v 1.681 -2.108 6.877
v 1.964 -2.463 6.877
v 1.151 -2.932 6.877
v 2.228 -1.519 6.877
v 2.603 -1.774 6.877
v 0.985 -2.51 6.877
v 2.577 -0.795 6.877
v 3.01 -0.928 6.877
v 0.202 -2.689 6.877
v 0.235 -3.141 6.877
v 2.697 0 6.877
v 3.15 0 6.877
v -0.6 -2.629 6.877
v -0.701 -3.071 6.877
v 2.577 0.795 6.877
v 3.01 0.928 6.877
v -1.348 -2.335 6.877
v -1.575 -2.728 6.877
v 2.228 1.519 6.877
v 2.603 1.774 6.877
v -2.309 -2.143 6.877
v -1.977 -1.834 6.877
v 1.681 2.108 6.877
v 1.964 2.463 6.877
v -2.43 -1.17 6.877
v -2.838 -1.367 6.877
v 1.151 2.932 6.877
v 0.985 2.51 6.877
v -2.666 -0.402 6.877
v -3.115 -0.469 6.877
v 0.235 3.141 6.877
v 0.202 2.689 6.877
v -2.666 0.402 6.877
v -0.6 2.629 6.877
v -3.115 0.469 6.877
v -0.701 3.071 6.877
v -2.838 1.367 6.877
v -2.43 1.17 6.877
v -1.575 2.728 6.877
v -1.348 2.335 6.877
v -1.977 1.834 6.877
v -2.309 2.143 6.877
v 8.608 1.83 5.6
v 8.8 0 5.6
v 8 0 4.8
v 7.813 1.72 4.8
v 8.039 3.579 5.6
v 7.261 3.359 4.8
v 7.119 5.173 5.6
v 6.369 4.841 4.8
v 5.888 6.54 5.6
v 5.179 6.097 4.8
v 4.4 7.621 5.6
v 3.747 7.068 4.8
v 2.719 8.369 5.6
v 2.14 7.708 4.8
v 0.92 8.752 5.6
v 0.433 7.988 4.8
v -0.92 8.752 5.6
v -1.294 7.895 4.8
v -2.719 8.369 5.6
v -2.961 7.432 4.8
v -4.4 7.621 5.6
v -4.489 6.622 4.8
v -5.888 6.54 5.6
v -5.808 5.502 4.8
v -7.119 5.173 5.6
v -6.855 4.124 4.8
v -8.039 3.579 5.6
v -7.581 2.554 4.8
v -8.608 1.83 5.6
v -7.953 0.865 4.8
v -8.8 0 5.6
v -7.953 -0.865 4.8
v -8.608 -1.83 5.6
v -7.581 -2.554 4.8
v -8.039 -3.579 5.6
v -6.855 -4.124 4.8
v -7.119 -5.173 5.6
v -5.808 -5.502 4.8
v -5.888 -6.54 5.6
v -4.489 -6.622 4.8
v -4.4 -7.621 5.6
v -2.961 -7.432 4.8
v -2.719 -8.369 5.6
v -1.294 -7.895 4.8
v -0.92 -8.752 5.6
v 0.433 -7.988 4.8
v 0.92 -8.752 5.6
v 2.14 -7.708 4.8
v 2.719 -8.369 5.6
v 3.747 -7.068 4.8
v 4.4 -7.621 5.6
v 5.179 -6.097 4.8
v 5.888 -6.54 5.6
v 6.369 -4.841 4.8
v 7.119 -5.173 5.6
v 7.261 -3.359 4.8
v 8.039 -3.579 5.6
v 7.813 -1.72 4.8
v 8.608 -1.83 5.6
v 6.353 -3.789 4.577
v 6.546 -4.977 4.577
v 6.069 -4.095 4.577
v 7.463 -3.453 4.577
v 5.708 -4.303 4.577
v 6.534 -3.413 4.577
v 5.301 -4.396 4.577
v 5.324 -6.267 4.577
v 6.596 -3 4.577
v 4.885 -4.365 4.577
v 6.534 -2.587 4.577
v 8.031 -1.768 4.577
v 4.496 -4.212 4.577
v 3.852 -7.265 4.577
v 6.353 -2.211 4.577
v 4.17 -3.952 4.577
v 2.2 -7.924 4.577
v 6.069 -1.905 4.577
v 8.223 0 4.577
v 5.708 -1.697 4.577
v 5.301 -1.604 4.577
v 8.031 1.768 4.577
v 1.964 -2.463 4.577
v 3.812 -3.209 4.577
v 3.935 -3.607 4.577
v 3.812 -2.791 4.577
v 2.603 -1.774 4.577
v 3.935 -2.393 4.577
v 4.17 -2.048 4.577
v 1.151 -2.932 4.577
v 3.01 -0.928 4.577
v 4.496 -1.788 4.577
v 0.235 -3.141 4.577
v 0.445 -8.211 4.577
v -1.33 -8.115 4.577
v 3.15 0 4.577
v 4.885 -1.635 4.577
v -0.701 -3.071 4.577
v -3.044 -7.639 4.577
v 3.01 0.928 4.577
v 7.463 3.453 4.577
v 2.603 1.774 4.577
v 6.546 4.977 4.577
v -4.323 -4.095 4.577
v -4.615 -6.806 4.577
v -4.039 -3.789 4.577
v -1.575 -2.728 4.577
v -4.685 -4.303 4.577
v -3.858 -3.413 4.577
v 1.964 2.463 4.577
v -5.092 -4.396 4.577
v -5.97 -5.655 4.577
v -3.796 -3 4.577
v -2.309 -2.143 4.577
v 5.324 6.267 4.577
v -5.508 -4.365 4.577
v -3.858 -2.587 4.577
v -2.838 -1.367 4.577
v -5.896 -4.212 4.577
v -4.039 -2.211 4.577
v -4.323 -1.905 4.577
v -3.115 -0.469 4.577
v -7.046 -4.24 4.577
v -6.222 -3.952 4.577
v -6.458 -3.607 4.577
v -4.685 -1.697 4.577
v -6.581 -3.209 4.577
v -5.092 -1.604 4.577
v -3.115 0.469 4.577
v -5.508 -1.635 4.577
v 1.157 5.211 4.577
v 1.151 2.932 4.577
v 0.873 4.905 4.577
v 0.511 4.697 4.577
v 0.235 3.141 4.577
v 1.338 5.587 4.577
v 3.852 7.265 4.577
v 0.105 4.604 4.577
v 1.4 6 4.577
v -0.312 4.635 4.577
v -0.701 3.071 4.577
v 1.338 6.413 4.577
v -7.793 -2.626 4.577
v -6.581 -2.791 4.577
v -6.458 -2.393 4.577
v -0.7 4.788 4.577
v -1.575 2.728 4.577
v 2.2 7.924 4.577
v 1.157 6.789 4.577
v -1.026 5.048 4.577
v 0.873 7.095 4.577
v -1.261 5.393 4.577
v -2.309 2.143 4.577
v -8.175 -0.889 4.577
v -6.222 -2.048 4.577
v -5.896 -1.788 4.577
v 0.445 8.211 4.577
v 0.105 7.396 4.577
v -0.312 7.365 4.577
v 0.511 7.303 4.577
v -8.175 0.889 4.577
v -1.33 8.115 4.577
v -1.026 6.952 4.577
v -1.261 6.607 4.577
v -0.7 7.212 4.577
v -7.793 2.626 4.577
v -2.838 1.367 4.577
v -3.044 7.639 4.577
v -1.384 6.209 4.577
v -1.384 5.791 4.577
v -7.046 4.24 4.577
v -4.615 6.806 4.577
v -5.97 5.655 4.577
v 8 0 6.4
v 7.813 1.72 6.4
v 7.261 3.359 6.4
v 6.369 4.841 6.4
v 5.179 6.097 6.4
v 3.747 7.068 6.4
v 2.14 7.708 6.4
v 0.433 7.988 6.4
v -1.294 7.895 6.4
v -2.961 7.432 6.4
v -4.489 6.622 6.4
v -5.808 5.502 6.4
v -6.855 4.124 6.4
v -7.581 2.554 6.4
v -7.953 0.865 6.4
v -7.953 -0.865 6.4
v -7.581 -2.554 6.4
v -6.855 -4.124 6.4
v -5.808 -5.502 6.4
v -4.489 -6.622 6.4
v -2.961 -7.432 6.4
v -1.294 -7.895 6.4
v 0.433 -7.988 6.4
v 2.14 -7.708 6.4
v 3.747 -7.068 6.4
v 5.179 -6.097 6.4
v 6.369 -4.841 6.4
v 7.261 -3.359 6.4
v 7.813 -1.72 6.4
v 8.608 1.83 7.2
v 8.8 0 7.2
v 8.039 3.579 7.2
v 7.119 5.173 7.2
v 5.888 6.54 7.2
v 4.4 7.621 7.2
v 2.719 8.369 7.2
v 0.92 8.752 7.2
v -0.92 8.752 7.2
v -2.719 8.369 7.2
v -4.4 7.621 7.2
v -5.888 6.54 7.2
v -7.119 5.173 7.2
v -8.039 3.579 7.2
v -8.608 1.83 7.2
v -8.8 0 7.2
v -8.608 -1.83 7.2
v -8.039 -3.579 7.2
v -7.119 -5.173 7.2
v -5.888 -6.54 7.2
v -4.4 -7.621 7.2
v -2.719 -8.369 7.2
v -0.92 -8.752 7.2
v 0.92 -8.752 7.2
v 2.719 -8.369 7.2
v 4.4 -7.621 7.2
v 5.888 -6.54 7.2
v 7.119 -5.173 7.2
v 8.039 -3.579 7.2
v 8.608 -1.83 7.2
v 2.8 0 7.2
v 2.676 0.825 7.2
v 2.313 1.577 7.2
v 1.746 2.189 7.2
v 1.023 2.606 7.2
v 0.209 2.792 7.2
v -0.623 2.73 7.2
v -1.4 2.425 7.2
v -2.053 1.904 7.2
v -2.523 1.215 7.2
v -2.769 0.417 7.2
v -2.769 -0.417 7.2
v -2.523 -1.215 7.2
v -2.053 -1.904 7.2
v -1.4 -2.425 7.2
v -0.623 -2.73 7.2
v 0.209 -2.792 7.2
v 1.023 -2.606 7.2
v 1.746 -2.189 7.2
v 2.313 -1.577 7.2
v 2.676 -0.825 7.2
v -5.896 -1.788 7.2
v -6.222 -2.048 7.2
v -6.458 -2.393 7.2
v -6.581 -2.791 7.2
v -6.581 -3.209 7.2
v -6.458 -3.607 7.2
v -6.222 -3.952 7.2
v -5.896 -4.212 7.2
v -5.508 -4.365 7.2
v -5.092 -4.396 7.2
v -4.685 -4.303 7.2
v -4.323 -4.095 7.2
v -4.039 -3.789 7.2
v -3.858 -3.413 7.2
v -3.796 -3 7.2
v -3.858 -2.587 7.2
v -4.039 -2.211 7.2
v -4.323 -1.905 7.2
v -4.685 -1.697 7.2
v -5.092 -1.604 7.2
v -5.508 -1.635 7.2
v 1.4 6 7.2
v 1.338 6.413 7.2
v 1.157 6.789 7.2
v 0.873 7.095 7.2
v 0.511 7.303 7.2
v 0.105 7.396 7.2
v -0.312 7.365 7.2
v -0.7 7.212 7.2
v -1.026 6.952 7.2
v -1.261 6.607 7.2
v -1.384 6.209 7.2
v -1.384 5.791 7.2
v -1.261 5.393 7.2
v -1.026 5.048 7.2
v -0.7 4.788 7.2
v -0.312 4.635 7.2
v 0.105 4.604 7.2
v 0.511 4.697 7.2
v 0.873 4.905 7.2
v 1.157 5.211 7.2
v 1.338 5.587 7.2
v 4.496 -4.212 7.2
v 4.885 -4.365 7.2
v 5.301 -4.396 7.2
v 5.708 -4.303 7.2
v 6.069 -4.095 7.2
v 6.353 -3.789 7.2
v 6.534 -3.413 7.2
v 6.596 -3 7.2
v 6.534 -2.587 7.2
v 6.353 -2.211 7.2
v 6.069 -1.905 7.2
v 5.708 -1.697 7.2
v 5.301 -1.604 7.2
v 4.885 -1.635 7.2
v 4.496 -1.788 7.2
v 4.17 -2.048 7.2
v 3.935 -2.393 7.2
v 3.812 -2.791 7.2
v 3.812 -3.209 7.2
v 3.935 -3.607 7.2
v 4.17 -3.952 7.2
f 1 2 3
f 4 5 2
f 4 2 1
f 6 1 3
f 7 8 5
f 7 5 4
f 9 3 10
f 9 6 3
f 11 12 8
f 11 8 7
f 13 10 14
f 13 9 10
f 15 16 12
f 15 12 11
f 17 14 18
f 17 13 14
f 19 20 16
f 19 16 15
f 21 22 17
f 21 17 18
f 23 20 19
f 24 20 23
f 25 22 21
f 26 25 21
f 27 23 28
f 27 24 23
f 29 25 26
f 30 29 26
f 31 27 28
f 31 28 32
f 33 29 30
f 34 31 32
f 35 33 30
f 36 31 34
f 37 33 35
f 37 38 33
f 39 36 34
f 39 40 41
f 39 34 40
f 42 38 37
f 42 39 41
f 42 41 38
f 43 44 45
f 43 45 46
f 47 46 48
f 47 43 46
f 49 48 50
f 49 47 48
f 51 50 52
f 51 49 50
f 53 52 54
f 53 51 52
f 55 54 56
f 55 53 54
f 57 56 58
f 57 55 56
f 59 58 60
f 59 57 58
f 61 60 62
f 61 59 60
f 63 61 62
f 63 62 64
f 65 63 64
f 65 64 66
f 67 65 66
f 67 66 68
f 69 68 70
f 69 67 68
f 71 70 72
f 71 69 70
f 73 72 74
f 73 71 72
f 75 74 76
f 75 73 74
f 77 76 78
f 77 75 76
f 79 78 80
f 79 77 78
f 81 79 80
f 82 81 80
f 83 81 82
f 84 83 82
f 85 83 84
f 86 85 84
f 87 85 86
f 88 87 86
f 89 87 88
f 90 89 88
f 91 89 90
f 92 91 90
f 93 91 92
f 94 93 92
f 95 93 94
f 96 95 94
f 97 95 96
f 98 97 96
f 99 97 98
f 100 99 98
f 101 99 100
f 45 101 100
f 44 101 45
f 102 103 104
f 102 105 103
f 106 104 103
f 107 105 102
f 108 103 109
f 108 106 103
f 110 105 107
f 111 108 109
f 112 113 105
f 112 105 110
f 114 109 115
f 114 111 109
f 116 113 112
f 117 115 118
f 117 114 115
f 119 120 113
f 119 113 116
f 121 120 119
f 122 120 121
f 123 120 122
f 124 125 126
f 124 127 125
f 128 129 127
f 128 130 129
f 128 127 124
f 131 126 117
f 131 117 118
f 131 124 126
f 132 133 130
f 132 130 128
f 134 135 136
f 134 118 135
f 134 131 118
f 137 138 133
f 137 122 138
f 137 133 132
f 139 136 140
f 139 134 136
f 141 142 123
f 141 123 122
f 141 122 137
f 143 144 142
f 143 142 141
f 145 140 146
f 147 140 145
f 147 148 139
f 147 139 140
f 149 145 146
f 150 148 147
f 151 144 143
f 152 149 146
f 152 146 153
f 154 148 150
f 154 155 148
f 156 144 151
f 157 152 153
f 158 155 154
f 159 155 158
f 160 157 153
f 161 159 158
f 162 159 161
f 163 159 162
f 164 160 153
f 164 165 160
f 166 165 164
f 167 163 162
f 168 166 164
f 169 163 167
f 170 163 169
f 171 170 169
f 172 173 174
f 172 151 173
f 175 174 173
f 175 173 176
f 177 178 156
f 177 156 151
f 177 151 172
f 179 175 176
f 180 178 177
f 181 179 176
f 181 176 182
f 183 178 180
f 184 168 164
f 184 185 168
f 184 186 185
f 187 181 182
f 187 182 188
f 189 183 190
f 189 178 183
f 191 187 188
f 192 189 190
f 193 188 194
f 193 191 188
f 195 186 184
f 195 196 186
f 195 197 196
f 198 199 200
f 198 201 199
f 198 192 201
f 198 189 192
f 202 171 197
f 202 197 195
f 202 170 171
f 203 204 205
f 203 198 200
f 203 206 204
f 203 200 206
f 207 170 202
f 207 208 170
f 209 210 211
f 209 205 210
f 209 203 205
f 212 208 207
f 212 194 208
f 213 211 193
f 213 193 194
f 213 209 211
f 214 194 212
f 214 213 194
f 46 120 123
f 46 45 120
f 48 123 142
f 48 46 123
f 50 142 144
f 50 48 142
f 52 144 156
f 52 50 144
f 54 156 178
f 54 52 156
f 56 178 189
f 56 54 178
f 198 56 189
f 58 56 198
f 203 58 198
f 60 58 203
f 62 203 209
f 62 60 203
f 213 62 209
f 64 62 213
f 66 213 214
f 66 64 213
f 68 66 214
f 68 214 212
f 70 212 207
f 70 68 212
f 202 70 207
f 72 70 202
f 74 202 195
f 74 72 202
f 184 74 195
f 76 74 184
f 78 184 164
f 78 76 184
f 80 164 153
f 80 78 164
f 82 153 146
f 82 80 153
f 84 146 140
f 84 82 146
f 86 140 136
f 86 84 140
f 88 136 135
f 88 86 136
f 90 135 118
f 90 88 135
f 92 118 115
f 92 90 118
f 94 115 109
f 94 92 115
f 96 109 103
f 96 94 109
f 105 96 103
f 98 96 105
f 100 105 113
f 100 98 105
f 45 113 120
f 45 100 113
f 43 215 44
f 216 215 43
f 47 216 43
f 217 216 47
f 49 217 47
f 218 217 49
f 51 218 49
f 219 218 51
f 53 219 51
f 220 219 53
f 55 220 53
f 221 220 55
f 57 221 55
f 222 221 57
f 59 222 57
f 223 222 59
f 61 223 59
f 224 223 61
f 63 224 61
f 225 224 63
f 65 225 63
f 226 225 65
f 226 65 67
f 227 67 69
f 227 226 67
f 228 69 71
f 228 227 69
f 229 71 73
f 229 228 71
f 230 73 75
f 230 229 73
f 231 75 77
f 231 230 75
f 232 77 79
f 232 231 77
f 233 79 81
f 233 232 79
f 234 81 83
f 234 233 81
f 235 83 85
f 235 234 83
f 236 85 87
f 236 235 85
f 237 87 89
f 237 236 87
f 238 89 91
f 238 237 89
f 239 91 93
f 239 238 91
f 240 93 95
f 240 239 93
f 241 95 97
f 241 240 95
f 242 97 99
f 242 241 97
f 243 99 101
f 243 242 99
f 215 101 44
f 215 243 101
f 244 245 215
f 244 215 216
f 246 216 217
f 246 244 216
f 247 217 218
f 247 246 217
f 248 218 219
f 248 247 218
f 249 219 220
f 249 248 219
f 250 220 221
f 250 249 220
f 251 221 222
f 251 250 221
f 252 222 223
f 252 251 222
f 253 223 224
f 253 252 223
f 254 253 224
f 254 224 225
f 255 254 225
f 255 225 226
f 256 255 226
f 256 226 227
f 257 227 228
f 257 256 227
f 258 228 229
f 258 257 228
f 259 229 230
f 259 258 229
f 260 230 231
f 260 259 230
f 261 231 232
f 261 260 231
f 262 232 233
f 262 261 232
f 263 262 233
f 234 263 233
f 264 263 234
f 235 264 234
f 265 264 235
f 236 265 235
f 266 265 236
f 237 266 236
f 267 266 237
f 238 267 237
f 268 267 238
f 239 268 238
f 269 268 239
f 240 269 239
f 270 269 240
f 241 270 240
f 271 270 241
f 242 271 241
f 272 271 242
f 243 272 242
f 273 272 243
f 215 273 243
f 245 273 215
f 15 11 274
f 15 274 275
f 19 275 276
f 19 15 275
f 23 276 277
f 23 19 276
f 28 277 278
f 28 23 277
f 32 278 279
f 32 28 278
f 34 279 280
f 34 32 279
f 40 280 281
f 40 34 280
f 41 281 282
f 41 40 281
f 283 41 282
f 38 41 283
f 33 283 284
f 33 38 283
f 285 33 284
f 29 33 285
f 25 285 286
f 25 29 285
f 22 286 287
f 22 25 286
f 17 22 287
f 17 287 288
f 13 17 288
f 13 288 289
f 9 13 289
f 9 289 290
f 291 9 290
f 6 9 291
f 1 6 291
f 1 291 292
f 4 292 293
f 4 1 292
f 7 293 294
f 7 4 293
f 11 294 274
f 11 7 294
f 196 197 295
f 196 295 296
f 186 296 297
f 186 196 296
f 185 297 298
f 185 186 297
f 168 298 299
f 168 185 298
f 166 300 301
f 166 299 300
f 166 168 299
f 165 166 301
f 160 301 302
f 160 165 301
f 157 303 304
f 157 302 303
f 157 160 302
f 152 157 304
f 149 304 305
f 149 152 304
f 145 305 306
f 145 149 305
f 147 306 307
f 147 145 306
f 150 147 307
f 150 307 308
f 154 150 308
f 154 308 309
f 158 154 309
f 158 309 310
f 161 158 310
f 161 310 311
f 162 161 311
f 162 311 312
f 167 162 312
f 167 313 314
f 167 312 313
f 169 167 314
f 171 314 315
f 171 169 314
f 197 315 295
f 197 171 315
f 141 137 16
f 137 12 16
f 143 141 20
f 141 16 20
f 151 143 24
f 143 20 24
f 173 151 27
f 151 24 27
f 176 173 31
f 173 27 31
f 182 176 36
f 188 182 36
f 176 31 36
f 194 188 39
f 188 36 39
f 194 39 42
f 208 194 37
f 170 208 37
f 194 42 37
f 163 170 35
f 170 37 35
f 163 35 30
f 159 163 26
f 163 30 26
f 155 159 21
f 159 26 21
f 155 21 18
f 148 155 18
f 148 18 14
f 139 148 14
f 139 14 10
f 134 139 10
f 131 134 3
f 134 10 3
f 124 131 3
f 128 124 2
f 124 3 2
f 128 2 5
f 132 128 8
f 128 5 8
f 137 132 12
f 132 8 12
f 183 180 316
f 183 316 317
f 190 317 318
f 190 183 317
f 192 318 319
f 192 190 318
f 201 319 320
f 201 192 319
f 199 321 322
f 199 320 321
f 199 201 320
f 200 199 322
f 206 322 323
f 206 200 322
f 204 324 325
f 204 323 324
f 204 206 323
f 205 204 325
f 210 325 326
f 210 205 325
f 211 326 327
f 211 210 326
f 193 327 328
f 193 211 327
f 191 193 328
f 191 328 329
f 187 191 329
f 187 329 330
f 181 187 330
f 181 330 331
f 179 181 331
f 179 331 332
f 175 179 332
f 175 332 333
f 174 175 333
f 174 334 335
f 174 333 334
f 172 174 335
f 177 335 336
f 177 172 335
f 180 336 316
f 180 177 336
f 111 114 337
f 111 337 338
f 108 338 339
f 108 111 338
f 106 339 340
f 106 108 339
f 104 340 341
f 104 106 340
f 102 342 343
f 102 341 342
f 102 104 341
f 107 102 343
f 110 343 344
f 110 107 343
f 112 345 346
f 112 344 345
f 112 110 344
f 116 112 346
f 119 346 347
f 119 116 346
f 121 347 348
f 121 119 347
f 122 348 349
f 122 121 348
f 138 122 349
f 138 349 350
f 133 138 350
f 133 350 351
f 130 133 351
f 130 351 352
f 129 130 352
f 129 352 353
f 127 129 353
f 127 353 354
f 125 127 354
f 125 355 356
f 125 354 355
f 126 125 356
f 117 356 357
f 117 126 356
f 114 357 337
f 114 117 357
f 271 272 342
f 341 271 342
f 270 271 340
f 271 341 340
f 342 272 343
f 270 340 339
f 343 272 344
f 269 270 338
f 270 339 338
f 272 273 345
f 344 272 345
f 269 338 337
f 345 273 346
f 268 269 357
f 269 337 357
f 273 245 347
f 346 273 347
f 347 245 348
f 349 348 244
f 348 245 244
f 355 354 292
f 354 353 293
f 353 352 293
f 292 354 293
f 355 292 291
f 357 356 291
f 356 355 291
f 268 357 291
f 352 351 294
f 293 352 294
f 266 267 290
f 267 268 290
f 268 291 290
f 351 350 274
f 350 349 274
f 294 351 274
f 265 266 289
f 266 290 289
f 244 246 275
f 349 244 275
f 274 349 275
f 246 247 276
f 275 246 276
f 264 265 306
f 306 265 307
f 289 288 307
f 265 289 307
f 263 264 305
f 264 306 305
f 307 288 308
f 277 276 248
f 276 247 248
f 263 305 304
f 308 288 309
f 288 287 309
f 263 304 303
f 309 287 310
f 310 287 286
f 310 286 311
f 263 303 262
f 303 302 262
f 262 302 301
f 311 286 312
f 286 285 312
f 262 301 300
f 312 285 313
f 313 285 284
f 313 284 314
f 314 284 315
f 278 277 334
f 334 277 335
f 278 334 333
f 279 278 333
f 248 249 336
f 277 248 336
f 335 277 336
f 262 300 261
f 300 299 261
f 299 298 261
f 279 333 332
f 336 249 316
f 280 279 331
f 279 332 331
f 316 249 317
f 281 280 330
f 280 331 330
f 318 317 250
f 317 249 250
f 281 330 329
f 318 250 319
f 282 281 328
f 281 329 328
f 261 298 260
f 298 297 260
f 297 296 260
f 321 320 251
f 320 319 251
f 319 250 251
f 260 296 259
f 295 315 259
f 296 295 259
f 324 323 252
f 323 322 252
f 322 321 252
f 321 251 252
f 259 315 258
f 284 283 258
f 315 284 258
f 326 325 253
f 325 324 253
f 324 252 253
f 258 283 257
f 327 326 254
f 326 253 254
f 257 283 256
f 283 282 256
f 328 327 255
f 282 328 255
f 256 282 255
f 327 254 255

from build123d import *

# Parameters (mm, degrees)
SKETCH019_W    = 10
SKETCH019_H    = 2.7812096768
SKETCH005_W    = 10
SKETCH005_H    = 2.2955317108
CYLINDER_R     = 1.4
CYLINDER_DEPTH = 10
ARRAY001_COUNT = 3
SKETCH018_W    = 3.15
SKETCH018_H    = 2.3
SKETCH002_W    = 5
SKETCH002_H    = 6.8
ARRAY_Z_COUNT  = 6
ARRAY_Z_PITCH  = 1.6


with BuildPart() as clone_of_middledom001:
    # Sketch019 → Revolution008 (revolve)
    with BuildSketch(Plane.XZ):
        with Locations((5, 3.1861365492)):
            Rectangle(SKETCH019_W, SKETCH019_H)
    revolve(axis=Axis((0, 0, 0), (0, 0, 1)))


with BuildPart() as clone_of_lowerdomain001:
    # Sketch005 → Revolution004 (revolve)
    with BuildSketch(Plane.XZ):
        with Locations((5, 0.6477658554)):
            Rectangle(SKETCH005_W, SKETCH005_H)
    revolve(axis=Axis((0, 0, 0), (0, 0, 1)))


with BuildPart() as boltholes:
    # Cylinder → Cylinder (new body)
    with BuildSketch(Plane(origin=(0, 6, -1), x_dir=(1, 0, 0), z_dir=(0, 0, 1))):
        Circle(CYLINDER_R)
    extrude(amount=CYLINDER_DEPTH)

    # Array001: BoltHoles ×3 about axis
    array001_axis = Axis((0, 0, 0), (0, 0, 1))


with BuildPart() as boltholes_1:
    add(boltholes.part)
    for i in range(1, ARRAY001_COUNT):
        add(boltholes.part.rotate(array001_axis, i * 360 / ARRAY001_COUNT))


with BuildPart() as ps2long001:
    # Sketch018 → Revolution007 (revolve)
    with BuildSketch(Plane.XZ):
        with Locations((1.575, 5.7267413876)):
            Rectangle(SKETCH018_W, SKETCH018_H)
    revolve(axis=Axis((0, 0, 0), (0, 0, 1)))


with BuildPart() as clone_of_laq:
    # Sketch007 → Revolution006 (revolve)
    with BuildSketch(Plane.XZ):
        with BuildLine():
            ThreePointArc((1.5, 1.7955317108), (0.867020761, 2.4322916436), (0, 2.6655317108))
            Line((0, 2.6655317108), (0, 0.7955317108))
            Line((0, 0.7955317108), (1.5, 0.7955317108))
            Line((1.5, 1.7955317108), (1.5, 0.7955317108))
        make_face()
    revolve(axis=Axis((0, 0, 0), (0, 0, 1)))


with BuildPart() as innergroovedom001:
    # Sketch002 → Revolution002 (revolve)
    with BuildSketch(Plane.XZ):
        with Locations((7.5, 3.8)):
            Rectangle(SKETCH002_W, SKETCH002_H)
    revolve(axis=Axis((0, 0, 0), (0, 0, 1)))


with BuildPart() as innergroovetool:
    # Sketch001 → Revolution001 (revolve)
    with BuildSketch(Plane.XZ):
        Polygon((4, 8), (4, 6.4), (8, 6.4), (8.8, 7.2), (8, 8), align=None)
    revolve(axis=Axis((0, 0, 0), (0, 0, 1)))

    # Array Z: InnerGrooveTool ×6


with BuildPart() as innergroovetool_1:
    add(innergroovetool.part)
    with Locations(*[(0, 0, -i * ARRAY_Z_PITCH) for i in range(1, ARRAY_Z_COUNT)]):
        add(innergroovetool.part)

    # Common: intersect InnerGrooveDom001
    add(innergroovedom001.part, mode=Mode.INTERSECT)


with BuildPart() as laq0202nlaq0617upper:
    # Sketch → Revolution (revolve)
    with BuildSketch(Plane.XZ):
        Polygon((1.2, 0.4), (8, 0.4), (8, 7.2), (2.8, 7.2), (1.2, 2.2), align=None)
    revolve(axis=Axis((0, 0, 0), (0, 0, 1)))

    # Fusion001: union InnerGrooveTool
    add(innergroovetool_1.part)

    # Cut: cut Clone of LAQ
    add(clone_of_laq.part, mode=Mode.SUBTRACT)

    # Cut003: cut PS2Long001
    add(ps2long001.part, mode=Mode.SUBTRACT)

    # Cut001: cut BoltHoles
    add(boltholes_1.part, mode=Mode.SUBTRACT)

    # Cut002: cut Clone of LowerDomain001
    add(clone_of_lowerdomain001.part, mode=Mode.SUBTRACT)

    # Cut004: cut Clone of MiddleDom001
    add(clone_of_middledom001.part, mode=Mode.SUBTRACT)


solid = laq0202nlaq0617upper.part
